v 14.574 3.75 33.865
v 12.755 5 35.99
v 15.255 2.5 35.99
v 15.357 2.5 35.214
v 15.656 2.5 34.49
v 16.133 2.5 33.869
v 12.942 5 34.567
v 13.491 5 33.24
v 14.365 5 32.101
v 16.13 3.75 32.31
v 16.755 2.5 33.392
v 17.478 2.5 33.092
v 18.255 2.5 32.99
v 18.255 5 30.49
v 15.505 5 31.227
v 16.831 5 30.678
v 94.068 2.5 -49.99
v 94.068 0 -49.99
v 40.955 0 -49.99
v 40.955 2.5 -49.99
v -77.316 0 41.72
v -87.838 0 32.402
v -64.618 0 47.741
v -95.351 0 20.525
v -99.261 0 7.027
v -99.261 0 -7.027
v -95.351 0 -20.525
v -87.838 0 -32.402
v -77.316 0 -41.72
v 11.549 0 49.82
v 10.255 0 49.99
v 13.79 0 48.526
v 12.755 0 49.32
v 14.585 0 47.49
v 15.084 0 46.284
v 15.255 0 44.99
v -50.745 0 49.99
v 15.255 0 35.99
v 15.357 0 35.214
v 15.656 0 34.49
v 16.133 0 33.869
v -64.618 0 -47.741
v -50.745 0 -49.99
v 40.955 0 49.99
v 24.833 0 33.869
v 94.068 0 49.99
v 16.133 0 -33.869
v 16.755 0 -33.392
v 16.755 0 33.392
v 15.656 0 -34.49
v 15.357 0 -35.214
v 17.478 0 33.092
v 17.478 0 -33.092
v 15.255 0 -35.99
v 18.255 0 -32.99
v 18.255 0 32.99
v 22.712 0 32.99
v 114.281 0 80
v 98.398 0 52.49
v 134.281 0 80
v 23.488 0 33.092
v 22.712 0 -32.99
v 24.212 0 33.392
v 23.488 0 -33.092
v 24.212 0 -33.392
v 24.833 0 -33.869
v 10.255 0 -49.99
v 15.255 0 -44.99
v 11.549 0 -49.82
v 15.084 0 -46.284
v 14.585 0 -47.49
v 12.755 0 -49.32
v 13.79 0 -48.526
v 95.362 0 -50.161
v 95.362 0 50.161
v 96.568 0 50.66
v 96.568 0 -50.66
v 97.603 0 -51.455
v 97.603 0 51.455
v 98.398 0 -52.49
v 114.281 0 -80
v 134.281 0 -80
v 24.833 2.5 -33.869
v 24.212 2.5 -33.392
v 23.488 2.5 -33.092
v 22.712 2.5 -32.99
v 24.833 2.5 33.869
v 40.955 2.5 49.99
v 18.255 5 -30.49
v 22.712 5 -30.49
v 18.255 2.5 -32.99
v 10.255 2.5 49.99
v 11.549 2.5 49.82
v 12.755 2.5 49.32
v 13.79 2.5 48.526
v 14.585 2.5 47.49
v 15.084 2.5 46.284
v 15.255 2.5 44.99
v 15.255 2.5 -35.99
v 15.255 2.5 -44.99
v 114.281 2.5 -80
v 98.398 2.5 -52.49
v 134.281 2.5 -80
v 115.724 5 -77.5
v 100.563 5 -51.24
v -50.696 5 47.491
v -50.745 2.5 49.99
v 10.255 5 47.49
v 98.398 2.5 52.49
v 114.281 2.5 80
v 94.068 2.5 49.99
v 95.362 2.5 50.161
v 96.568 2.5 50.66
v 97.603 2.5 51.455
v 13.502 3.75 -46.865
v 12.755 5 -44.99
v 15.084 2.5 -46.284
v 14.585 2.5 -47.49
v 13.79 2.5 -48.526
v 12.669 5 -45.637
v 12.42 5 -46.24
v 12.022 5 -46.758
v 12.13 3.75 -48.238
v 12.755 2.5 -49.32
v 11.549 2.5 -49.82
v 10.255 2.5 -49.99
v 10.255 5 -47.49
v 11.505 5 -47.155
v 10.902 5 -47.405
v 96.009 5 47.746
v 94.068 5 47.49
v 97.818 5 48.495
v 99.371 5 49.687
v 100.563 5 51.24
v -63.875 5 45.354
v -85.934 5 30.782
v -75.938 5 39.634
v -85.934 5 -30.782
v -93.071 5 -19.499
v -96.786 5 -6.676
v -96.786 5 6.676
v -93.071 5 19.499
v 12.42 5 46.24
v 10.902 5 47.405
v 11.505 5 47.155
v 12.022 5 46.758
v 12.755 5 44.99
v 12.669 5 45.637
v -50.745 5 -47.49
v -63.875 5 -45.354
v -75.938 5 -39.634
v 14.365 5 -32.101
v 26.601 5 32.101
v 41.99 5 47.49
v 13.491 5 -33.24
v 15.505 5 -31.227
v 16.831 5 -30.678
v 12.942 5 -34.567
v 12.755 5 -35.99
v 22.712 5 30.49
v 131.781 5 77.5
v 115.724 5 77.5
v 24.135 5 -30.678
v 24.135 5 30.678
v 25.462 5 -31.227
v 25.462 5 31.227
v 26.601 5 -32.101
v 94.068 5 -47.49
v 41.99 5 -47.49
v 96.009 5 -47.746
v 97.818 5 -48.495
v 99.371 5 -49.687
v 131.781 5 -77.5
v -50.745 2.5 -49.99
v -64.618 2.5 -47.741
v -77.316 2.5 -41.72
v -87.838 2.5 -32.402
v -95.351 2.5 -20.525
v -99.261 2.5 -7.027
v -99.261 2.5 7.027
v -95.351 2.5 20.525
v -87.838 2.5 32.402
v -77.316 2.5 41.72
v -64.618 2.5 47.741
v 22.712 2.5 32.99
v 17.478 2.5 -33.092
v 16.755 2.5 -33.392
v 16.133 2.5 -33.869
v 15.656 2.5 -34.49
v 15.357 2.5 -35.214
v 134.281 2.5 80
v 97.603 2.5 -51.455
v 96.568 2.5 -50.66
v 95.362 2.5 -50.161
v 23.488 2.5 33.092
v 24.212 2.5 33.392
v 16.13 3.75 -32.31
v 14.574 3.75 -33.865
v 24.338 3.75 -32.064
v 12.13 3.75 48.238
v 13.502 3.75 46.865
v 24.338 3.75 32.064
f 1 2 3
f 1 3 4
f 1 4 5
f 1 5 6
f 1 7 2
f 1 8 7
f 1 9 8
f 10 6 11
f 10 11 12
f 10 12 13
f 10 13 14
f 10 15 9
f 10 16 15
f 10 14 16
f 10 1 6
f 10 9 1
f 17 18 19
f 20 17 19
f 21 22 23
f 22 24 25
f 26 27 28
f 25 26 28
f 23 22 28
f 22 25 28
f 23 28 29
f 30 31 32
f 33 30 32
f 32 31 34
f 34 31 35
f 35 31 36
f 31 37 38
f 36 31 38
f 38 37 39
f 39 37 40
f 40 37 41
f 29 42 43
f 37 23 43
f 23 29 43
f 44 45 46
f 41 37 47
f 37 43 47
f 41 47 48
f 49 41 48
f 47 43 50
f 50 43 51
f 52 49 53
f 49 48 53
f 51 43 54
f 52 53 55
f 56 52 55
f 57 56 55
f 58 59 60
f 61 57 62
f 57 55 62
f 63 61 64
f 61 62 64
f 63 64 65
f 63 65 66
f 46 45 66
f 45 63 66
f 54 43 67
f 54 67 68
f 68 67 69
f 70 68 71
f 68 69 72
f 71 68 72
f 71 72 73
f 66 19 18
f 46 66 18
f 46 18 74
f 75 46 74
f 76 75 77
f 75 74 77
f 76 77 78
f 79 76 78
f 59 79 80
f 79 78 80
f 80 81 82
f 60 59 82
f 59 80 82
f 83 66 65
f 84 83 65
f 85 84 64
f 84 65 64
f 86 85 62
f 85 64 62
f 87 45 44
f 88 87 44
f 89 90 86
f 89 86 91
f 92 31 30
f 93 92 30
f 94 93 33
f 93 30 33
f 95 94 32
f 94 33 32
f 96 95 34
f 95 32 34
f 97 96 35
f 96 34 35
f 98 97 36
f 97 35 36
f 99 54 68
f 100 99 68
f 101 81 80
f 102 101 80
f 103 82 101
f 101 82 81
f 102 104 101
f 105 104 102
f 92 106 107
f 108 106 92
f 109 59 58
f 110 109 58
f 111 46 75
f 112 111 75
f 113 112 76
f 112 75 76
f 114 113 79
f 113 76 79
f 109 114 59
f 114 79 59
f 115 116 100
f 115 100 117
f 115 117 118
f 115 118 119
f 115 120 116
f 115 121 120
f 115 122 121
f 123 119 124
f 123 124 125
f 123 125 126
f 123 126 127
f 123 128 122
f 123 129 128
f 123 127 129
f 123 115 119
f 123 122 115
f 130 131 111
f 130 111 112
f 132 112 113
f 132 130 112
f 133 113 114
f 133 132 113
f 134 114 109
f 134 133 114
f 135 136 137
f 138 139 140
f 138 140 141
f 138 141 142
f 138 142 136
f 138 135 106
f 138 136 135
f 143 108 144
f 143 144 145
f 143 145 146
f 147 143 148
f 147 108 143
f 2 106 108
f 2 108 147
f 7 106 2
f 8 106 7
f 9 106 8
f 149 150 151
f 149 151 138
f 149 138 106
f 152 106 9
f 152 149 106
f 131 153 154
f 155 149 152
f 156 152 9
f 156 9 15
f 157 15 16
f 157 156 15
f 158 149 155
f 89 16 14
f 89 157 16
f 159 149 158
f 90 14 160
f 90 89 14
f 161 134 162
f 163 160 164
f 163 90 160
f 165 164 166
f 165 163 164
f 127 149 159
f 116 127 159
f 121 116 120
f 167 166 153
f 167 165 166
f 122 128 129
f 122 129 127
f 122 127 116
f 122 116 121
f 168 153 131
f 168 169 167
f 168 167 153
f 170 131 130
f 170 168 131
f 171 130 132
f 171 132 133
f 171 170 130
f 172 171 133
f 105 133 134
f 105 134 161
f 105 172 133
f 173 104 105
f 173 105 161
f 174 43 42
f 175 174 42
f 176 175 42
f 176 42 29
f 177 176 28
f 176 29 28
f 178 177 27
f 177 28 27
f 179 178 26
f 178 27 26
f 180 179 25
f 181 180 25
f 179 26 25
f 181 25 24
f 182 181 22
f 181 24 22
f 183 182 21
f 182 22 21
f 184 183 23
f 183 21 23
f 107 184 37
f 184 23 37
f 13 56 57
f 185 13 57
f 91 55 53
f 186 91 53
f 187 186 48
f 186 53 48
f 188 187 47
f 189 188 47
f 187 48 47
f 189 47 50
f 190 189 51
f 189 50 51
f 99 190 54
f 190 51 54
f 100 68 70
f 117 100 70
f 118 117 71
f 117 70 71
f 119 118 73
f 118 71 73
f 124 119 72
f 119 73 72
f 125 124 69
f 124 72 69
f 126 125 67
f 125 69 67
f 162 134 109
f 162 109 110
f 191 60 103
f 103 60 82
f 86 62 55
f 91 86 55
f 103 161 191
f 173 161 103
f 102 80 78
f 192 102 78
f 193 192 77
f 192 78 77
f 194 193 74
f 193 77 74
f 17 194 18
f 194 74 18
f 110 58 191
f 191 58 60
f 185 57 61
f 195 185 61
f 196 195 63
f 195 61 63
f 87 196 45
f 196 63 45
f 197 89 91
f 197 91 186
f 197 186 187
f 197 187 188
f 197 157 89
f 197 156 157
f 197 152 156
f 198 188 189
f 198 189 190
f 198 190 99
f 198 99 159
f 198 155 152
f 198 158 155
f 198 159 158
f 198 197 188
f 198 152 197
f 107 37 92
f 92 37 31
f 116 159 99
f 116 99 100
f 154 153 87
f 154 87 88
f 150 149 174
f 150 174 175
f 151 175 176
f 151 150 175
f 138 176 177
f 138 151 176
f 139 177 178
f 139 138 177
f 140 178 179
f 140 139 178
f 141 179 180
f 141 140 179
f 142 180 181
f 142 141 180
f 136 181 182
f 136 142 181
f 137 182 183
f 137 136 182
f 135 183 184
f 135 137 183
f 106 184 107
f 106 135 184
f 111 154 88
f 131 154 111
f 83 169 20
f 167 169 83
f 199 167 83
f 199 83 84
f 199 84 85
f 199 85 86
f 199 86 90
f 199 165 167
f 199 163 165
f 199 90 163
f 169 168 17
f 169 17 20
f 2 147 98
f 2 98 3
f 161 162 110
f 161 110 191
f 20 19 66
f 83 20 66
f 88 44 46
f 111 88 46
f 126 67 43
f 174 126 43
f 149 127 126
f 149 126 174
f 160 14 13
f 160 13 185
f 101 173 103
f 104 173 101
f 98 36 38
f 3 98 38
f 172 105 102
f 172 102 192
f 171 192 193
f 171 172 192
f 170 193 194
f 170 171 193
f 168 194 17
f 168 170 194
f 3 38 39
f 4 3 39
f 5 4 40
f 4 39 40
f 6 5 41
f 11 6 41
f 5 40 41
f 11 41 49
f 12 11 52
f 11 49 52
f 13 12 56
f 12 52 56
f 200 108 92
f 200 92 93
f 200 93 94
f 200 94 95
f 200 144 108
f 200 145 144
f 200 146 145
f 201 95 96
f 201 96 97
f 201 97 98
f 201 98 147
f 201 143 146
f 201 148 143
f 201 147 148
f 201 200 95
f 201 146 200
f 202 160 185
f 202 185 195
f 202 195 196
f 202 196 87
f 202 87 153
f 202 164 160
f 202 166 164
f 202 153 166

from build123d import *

# Parameters (mm, degrees)
BOSS_EXTRUDE1_DEPTH = 5
CHAMFER1_SIZE       = 2.5


with BuildPart() as part:
    # Sketch1 → Boss-Extrude1 (new body)
    with BuildSketch(Plane(origin=(0, 0, 0), x_dir=(1, 0, 0), z_dir=(0, 1, 0))):
        with BuildLine():
            Line((15.254575611, 35.990242765), (15.254575611, 44.990242765))
            ThreePointArc((15.254575611, 44.990242765), (13.790109517, 48.525776671), (10.254575611, 49.990242765))
            Line((10.254575611, 49.990242765), (-50.745424389, 49.990242765))
            ThreePointArc((-50.745424389, 49.990242765), (-99.757685432, 0), (-50.745424389, -49.990242765))
            Line((-50.745424389, -49.990242765), (10.254575611, -49.990242765))
            ThreePointArc((10.254575611, -49.990242765), (13.790109517, -48.525776671), (15.254575611, -44.990242765))
            Line((15.254575611, -44.990242765), (15.254575611, -35.990242765))
            ThreePointArc((15.254575611, -35.990242765), (16.133255268, -33.868922422), (18.254575611, -32.990242765))
            Line((18.254575611, -32.990242765), (22.711934924, -32.990242765))
            ThreePointArc((22.711934924, -32.990242765), (23.859985221, -33.218604168), (24.833255268, -33.868922422))
            Line((24.833255268, -33.868922422), (40.954575611, -49.990242765))
            Line((40.954575611, -49.990242765), (50.745424389, -49.990242765))
            Line((50.745424389, -49.990242765), (94.067824265, -49.990242765))
            ThreePointArc((94.067824265, -49.990242765), (96.567824265, -50.660115747), (98.397951284, -52.490242765))
            Line((98.397951284, -52.490242765), (114.280717029, -80))
            Line((114.280717029, -80), (134.280717029, -80))
            Line((134.280717029, -80), (134.280717029, 80))
            Line((134.280717029, 80), (114.280717029, 80))
            Line((114.280717029, 80), (98.397951284, 52.490242765))
            ThreePointArc((98.397951284, 52.490242765), (96.567824265, 50.660115747), (94.067824265, 49.990242765))
            Line((94.067824265, 49.990242765), (50.745424389, 49.990242765))
            Line((50.745424389, 49.990242765), (40.954575611, 49.990242765))
            Line((40.954575611, 49.990242765), (24.833255268, 33.868922422))
            ThreePointArc((24.833255268, 33.868922422), (23.859985221, 33.218604168), (22.711934924, 32.990242765))
            Line((22.711934924, 32.990242765), (18.254575611, 32.990242765))
            ThreePointArc((18.254575611, 32.990242765), (16.133255268, 33.868922422), (15.254575611, 35.990242765))
        make_face()
    extrude(amount=BOSS_EXTRUDE1_DEPTH)

    # Chamfer1
    chamfer1_edges = [part.edges().sort_by_distance(p)[0] for p in [
        (96.567824265, 5, 50.660115747),
        (106.339334157, 5, 66.245121383),
        (96.567824265, 5, -50.660115747),
        (124.280717029, 5, 80),
        (134.280717029, 5, 0),
        (124.280717029, 5, -80),
        (67.511199938, 5, -49.990242765),
        (32.893915439, 5, -41.929582594),
        (23.859985221, 5, -33.218604168),
        (20.483255268, 5, -32.990242765),
        (16.133255268, 5, -33.868922422),
        (15.254575611, 5, -40.490242765),
        (13.790109517, 5, -48.525776671),
        (-20.245424389, 5, -49.990242765),
        (-99.757685432, 5, 0),
        (106.339334157, 5, -66.245121383),
        (-20.245424389, 5, 49.990242765),
        (13.790109517, 5, 48.525776671),
        (15.254575611, 5, 40.490242765),
        (16.133255268, 5, 33.868922422),
        (20.483255268, 5, 32.990242765),
        (23.859985221, 5, 33.218604168),
        (32.893915439, 5, 41.929582594),
        (67.511199938, 5, 49.990242765),
    ]]
    chamfer(chamfer1_edges, length=CHAMFER1_SIZE)


solid = part.part
